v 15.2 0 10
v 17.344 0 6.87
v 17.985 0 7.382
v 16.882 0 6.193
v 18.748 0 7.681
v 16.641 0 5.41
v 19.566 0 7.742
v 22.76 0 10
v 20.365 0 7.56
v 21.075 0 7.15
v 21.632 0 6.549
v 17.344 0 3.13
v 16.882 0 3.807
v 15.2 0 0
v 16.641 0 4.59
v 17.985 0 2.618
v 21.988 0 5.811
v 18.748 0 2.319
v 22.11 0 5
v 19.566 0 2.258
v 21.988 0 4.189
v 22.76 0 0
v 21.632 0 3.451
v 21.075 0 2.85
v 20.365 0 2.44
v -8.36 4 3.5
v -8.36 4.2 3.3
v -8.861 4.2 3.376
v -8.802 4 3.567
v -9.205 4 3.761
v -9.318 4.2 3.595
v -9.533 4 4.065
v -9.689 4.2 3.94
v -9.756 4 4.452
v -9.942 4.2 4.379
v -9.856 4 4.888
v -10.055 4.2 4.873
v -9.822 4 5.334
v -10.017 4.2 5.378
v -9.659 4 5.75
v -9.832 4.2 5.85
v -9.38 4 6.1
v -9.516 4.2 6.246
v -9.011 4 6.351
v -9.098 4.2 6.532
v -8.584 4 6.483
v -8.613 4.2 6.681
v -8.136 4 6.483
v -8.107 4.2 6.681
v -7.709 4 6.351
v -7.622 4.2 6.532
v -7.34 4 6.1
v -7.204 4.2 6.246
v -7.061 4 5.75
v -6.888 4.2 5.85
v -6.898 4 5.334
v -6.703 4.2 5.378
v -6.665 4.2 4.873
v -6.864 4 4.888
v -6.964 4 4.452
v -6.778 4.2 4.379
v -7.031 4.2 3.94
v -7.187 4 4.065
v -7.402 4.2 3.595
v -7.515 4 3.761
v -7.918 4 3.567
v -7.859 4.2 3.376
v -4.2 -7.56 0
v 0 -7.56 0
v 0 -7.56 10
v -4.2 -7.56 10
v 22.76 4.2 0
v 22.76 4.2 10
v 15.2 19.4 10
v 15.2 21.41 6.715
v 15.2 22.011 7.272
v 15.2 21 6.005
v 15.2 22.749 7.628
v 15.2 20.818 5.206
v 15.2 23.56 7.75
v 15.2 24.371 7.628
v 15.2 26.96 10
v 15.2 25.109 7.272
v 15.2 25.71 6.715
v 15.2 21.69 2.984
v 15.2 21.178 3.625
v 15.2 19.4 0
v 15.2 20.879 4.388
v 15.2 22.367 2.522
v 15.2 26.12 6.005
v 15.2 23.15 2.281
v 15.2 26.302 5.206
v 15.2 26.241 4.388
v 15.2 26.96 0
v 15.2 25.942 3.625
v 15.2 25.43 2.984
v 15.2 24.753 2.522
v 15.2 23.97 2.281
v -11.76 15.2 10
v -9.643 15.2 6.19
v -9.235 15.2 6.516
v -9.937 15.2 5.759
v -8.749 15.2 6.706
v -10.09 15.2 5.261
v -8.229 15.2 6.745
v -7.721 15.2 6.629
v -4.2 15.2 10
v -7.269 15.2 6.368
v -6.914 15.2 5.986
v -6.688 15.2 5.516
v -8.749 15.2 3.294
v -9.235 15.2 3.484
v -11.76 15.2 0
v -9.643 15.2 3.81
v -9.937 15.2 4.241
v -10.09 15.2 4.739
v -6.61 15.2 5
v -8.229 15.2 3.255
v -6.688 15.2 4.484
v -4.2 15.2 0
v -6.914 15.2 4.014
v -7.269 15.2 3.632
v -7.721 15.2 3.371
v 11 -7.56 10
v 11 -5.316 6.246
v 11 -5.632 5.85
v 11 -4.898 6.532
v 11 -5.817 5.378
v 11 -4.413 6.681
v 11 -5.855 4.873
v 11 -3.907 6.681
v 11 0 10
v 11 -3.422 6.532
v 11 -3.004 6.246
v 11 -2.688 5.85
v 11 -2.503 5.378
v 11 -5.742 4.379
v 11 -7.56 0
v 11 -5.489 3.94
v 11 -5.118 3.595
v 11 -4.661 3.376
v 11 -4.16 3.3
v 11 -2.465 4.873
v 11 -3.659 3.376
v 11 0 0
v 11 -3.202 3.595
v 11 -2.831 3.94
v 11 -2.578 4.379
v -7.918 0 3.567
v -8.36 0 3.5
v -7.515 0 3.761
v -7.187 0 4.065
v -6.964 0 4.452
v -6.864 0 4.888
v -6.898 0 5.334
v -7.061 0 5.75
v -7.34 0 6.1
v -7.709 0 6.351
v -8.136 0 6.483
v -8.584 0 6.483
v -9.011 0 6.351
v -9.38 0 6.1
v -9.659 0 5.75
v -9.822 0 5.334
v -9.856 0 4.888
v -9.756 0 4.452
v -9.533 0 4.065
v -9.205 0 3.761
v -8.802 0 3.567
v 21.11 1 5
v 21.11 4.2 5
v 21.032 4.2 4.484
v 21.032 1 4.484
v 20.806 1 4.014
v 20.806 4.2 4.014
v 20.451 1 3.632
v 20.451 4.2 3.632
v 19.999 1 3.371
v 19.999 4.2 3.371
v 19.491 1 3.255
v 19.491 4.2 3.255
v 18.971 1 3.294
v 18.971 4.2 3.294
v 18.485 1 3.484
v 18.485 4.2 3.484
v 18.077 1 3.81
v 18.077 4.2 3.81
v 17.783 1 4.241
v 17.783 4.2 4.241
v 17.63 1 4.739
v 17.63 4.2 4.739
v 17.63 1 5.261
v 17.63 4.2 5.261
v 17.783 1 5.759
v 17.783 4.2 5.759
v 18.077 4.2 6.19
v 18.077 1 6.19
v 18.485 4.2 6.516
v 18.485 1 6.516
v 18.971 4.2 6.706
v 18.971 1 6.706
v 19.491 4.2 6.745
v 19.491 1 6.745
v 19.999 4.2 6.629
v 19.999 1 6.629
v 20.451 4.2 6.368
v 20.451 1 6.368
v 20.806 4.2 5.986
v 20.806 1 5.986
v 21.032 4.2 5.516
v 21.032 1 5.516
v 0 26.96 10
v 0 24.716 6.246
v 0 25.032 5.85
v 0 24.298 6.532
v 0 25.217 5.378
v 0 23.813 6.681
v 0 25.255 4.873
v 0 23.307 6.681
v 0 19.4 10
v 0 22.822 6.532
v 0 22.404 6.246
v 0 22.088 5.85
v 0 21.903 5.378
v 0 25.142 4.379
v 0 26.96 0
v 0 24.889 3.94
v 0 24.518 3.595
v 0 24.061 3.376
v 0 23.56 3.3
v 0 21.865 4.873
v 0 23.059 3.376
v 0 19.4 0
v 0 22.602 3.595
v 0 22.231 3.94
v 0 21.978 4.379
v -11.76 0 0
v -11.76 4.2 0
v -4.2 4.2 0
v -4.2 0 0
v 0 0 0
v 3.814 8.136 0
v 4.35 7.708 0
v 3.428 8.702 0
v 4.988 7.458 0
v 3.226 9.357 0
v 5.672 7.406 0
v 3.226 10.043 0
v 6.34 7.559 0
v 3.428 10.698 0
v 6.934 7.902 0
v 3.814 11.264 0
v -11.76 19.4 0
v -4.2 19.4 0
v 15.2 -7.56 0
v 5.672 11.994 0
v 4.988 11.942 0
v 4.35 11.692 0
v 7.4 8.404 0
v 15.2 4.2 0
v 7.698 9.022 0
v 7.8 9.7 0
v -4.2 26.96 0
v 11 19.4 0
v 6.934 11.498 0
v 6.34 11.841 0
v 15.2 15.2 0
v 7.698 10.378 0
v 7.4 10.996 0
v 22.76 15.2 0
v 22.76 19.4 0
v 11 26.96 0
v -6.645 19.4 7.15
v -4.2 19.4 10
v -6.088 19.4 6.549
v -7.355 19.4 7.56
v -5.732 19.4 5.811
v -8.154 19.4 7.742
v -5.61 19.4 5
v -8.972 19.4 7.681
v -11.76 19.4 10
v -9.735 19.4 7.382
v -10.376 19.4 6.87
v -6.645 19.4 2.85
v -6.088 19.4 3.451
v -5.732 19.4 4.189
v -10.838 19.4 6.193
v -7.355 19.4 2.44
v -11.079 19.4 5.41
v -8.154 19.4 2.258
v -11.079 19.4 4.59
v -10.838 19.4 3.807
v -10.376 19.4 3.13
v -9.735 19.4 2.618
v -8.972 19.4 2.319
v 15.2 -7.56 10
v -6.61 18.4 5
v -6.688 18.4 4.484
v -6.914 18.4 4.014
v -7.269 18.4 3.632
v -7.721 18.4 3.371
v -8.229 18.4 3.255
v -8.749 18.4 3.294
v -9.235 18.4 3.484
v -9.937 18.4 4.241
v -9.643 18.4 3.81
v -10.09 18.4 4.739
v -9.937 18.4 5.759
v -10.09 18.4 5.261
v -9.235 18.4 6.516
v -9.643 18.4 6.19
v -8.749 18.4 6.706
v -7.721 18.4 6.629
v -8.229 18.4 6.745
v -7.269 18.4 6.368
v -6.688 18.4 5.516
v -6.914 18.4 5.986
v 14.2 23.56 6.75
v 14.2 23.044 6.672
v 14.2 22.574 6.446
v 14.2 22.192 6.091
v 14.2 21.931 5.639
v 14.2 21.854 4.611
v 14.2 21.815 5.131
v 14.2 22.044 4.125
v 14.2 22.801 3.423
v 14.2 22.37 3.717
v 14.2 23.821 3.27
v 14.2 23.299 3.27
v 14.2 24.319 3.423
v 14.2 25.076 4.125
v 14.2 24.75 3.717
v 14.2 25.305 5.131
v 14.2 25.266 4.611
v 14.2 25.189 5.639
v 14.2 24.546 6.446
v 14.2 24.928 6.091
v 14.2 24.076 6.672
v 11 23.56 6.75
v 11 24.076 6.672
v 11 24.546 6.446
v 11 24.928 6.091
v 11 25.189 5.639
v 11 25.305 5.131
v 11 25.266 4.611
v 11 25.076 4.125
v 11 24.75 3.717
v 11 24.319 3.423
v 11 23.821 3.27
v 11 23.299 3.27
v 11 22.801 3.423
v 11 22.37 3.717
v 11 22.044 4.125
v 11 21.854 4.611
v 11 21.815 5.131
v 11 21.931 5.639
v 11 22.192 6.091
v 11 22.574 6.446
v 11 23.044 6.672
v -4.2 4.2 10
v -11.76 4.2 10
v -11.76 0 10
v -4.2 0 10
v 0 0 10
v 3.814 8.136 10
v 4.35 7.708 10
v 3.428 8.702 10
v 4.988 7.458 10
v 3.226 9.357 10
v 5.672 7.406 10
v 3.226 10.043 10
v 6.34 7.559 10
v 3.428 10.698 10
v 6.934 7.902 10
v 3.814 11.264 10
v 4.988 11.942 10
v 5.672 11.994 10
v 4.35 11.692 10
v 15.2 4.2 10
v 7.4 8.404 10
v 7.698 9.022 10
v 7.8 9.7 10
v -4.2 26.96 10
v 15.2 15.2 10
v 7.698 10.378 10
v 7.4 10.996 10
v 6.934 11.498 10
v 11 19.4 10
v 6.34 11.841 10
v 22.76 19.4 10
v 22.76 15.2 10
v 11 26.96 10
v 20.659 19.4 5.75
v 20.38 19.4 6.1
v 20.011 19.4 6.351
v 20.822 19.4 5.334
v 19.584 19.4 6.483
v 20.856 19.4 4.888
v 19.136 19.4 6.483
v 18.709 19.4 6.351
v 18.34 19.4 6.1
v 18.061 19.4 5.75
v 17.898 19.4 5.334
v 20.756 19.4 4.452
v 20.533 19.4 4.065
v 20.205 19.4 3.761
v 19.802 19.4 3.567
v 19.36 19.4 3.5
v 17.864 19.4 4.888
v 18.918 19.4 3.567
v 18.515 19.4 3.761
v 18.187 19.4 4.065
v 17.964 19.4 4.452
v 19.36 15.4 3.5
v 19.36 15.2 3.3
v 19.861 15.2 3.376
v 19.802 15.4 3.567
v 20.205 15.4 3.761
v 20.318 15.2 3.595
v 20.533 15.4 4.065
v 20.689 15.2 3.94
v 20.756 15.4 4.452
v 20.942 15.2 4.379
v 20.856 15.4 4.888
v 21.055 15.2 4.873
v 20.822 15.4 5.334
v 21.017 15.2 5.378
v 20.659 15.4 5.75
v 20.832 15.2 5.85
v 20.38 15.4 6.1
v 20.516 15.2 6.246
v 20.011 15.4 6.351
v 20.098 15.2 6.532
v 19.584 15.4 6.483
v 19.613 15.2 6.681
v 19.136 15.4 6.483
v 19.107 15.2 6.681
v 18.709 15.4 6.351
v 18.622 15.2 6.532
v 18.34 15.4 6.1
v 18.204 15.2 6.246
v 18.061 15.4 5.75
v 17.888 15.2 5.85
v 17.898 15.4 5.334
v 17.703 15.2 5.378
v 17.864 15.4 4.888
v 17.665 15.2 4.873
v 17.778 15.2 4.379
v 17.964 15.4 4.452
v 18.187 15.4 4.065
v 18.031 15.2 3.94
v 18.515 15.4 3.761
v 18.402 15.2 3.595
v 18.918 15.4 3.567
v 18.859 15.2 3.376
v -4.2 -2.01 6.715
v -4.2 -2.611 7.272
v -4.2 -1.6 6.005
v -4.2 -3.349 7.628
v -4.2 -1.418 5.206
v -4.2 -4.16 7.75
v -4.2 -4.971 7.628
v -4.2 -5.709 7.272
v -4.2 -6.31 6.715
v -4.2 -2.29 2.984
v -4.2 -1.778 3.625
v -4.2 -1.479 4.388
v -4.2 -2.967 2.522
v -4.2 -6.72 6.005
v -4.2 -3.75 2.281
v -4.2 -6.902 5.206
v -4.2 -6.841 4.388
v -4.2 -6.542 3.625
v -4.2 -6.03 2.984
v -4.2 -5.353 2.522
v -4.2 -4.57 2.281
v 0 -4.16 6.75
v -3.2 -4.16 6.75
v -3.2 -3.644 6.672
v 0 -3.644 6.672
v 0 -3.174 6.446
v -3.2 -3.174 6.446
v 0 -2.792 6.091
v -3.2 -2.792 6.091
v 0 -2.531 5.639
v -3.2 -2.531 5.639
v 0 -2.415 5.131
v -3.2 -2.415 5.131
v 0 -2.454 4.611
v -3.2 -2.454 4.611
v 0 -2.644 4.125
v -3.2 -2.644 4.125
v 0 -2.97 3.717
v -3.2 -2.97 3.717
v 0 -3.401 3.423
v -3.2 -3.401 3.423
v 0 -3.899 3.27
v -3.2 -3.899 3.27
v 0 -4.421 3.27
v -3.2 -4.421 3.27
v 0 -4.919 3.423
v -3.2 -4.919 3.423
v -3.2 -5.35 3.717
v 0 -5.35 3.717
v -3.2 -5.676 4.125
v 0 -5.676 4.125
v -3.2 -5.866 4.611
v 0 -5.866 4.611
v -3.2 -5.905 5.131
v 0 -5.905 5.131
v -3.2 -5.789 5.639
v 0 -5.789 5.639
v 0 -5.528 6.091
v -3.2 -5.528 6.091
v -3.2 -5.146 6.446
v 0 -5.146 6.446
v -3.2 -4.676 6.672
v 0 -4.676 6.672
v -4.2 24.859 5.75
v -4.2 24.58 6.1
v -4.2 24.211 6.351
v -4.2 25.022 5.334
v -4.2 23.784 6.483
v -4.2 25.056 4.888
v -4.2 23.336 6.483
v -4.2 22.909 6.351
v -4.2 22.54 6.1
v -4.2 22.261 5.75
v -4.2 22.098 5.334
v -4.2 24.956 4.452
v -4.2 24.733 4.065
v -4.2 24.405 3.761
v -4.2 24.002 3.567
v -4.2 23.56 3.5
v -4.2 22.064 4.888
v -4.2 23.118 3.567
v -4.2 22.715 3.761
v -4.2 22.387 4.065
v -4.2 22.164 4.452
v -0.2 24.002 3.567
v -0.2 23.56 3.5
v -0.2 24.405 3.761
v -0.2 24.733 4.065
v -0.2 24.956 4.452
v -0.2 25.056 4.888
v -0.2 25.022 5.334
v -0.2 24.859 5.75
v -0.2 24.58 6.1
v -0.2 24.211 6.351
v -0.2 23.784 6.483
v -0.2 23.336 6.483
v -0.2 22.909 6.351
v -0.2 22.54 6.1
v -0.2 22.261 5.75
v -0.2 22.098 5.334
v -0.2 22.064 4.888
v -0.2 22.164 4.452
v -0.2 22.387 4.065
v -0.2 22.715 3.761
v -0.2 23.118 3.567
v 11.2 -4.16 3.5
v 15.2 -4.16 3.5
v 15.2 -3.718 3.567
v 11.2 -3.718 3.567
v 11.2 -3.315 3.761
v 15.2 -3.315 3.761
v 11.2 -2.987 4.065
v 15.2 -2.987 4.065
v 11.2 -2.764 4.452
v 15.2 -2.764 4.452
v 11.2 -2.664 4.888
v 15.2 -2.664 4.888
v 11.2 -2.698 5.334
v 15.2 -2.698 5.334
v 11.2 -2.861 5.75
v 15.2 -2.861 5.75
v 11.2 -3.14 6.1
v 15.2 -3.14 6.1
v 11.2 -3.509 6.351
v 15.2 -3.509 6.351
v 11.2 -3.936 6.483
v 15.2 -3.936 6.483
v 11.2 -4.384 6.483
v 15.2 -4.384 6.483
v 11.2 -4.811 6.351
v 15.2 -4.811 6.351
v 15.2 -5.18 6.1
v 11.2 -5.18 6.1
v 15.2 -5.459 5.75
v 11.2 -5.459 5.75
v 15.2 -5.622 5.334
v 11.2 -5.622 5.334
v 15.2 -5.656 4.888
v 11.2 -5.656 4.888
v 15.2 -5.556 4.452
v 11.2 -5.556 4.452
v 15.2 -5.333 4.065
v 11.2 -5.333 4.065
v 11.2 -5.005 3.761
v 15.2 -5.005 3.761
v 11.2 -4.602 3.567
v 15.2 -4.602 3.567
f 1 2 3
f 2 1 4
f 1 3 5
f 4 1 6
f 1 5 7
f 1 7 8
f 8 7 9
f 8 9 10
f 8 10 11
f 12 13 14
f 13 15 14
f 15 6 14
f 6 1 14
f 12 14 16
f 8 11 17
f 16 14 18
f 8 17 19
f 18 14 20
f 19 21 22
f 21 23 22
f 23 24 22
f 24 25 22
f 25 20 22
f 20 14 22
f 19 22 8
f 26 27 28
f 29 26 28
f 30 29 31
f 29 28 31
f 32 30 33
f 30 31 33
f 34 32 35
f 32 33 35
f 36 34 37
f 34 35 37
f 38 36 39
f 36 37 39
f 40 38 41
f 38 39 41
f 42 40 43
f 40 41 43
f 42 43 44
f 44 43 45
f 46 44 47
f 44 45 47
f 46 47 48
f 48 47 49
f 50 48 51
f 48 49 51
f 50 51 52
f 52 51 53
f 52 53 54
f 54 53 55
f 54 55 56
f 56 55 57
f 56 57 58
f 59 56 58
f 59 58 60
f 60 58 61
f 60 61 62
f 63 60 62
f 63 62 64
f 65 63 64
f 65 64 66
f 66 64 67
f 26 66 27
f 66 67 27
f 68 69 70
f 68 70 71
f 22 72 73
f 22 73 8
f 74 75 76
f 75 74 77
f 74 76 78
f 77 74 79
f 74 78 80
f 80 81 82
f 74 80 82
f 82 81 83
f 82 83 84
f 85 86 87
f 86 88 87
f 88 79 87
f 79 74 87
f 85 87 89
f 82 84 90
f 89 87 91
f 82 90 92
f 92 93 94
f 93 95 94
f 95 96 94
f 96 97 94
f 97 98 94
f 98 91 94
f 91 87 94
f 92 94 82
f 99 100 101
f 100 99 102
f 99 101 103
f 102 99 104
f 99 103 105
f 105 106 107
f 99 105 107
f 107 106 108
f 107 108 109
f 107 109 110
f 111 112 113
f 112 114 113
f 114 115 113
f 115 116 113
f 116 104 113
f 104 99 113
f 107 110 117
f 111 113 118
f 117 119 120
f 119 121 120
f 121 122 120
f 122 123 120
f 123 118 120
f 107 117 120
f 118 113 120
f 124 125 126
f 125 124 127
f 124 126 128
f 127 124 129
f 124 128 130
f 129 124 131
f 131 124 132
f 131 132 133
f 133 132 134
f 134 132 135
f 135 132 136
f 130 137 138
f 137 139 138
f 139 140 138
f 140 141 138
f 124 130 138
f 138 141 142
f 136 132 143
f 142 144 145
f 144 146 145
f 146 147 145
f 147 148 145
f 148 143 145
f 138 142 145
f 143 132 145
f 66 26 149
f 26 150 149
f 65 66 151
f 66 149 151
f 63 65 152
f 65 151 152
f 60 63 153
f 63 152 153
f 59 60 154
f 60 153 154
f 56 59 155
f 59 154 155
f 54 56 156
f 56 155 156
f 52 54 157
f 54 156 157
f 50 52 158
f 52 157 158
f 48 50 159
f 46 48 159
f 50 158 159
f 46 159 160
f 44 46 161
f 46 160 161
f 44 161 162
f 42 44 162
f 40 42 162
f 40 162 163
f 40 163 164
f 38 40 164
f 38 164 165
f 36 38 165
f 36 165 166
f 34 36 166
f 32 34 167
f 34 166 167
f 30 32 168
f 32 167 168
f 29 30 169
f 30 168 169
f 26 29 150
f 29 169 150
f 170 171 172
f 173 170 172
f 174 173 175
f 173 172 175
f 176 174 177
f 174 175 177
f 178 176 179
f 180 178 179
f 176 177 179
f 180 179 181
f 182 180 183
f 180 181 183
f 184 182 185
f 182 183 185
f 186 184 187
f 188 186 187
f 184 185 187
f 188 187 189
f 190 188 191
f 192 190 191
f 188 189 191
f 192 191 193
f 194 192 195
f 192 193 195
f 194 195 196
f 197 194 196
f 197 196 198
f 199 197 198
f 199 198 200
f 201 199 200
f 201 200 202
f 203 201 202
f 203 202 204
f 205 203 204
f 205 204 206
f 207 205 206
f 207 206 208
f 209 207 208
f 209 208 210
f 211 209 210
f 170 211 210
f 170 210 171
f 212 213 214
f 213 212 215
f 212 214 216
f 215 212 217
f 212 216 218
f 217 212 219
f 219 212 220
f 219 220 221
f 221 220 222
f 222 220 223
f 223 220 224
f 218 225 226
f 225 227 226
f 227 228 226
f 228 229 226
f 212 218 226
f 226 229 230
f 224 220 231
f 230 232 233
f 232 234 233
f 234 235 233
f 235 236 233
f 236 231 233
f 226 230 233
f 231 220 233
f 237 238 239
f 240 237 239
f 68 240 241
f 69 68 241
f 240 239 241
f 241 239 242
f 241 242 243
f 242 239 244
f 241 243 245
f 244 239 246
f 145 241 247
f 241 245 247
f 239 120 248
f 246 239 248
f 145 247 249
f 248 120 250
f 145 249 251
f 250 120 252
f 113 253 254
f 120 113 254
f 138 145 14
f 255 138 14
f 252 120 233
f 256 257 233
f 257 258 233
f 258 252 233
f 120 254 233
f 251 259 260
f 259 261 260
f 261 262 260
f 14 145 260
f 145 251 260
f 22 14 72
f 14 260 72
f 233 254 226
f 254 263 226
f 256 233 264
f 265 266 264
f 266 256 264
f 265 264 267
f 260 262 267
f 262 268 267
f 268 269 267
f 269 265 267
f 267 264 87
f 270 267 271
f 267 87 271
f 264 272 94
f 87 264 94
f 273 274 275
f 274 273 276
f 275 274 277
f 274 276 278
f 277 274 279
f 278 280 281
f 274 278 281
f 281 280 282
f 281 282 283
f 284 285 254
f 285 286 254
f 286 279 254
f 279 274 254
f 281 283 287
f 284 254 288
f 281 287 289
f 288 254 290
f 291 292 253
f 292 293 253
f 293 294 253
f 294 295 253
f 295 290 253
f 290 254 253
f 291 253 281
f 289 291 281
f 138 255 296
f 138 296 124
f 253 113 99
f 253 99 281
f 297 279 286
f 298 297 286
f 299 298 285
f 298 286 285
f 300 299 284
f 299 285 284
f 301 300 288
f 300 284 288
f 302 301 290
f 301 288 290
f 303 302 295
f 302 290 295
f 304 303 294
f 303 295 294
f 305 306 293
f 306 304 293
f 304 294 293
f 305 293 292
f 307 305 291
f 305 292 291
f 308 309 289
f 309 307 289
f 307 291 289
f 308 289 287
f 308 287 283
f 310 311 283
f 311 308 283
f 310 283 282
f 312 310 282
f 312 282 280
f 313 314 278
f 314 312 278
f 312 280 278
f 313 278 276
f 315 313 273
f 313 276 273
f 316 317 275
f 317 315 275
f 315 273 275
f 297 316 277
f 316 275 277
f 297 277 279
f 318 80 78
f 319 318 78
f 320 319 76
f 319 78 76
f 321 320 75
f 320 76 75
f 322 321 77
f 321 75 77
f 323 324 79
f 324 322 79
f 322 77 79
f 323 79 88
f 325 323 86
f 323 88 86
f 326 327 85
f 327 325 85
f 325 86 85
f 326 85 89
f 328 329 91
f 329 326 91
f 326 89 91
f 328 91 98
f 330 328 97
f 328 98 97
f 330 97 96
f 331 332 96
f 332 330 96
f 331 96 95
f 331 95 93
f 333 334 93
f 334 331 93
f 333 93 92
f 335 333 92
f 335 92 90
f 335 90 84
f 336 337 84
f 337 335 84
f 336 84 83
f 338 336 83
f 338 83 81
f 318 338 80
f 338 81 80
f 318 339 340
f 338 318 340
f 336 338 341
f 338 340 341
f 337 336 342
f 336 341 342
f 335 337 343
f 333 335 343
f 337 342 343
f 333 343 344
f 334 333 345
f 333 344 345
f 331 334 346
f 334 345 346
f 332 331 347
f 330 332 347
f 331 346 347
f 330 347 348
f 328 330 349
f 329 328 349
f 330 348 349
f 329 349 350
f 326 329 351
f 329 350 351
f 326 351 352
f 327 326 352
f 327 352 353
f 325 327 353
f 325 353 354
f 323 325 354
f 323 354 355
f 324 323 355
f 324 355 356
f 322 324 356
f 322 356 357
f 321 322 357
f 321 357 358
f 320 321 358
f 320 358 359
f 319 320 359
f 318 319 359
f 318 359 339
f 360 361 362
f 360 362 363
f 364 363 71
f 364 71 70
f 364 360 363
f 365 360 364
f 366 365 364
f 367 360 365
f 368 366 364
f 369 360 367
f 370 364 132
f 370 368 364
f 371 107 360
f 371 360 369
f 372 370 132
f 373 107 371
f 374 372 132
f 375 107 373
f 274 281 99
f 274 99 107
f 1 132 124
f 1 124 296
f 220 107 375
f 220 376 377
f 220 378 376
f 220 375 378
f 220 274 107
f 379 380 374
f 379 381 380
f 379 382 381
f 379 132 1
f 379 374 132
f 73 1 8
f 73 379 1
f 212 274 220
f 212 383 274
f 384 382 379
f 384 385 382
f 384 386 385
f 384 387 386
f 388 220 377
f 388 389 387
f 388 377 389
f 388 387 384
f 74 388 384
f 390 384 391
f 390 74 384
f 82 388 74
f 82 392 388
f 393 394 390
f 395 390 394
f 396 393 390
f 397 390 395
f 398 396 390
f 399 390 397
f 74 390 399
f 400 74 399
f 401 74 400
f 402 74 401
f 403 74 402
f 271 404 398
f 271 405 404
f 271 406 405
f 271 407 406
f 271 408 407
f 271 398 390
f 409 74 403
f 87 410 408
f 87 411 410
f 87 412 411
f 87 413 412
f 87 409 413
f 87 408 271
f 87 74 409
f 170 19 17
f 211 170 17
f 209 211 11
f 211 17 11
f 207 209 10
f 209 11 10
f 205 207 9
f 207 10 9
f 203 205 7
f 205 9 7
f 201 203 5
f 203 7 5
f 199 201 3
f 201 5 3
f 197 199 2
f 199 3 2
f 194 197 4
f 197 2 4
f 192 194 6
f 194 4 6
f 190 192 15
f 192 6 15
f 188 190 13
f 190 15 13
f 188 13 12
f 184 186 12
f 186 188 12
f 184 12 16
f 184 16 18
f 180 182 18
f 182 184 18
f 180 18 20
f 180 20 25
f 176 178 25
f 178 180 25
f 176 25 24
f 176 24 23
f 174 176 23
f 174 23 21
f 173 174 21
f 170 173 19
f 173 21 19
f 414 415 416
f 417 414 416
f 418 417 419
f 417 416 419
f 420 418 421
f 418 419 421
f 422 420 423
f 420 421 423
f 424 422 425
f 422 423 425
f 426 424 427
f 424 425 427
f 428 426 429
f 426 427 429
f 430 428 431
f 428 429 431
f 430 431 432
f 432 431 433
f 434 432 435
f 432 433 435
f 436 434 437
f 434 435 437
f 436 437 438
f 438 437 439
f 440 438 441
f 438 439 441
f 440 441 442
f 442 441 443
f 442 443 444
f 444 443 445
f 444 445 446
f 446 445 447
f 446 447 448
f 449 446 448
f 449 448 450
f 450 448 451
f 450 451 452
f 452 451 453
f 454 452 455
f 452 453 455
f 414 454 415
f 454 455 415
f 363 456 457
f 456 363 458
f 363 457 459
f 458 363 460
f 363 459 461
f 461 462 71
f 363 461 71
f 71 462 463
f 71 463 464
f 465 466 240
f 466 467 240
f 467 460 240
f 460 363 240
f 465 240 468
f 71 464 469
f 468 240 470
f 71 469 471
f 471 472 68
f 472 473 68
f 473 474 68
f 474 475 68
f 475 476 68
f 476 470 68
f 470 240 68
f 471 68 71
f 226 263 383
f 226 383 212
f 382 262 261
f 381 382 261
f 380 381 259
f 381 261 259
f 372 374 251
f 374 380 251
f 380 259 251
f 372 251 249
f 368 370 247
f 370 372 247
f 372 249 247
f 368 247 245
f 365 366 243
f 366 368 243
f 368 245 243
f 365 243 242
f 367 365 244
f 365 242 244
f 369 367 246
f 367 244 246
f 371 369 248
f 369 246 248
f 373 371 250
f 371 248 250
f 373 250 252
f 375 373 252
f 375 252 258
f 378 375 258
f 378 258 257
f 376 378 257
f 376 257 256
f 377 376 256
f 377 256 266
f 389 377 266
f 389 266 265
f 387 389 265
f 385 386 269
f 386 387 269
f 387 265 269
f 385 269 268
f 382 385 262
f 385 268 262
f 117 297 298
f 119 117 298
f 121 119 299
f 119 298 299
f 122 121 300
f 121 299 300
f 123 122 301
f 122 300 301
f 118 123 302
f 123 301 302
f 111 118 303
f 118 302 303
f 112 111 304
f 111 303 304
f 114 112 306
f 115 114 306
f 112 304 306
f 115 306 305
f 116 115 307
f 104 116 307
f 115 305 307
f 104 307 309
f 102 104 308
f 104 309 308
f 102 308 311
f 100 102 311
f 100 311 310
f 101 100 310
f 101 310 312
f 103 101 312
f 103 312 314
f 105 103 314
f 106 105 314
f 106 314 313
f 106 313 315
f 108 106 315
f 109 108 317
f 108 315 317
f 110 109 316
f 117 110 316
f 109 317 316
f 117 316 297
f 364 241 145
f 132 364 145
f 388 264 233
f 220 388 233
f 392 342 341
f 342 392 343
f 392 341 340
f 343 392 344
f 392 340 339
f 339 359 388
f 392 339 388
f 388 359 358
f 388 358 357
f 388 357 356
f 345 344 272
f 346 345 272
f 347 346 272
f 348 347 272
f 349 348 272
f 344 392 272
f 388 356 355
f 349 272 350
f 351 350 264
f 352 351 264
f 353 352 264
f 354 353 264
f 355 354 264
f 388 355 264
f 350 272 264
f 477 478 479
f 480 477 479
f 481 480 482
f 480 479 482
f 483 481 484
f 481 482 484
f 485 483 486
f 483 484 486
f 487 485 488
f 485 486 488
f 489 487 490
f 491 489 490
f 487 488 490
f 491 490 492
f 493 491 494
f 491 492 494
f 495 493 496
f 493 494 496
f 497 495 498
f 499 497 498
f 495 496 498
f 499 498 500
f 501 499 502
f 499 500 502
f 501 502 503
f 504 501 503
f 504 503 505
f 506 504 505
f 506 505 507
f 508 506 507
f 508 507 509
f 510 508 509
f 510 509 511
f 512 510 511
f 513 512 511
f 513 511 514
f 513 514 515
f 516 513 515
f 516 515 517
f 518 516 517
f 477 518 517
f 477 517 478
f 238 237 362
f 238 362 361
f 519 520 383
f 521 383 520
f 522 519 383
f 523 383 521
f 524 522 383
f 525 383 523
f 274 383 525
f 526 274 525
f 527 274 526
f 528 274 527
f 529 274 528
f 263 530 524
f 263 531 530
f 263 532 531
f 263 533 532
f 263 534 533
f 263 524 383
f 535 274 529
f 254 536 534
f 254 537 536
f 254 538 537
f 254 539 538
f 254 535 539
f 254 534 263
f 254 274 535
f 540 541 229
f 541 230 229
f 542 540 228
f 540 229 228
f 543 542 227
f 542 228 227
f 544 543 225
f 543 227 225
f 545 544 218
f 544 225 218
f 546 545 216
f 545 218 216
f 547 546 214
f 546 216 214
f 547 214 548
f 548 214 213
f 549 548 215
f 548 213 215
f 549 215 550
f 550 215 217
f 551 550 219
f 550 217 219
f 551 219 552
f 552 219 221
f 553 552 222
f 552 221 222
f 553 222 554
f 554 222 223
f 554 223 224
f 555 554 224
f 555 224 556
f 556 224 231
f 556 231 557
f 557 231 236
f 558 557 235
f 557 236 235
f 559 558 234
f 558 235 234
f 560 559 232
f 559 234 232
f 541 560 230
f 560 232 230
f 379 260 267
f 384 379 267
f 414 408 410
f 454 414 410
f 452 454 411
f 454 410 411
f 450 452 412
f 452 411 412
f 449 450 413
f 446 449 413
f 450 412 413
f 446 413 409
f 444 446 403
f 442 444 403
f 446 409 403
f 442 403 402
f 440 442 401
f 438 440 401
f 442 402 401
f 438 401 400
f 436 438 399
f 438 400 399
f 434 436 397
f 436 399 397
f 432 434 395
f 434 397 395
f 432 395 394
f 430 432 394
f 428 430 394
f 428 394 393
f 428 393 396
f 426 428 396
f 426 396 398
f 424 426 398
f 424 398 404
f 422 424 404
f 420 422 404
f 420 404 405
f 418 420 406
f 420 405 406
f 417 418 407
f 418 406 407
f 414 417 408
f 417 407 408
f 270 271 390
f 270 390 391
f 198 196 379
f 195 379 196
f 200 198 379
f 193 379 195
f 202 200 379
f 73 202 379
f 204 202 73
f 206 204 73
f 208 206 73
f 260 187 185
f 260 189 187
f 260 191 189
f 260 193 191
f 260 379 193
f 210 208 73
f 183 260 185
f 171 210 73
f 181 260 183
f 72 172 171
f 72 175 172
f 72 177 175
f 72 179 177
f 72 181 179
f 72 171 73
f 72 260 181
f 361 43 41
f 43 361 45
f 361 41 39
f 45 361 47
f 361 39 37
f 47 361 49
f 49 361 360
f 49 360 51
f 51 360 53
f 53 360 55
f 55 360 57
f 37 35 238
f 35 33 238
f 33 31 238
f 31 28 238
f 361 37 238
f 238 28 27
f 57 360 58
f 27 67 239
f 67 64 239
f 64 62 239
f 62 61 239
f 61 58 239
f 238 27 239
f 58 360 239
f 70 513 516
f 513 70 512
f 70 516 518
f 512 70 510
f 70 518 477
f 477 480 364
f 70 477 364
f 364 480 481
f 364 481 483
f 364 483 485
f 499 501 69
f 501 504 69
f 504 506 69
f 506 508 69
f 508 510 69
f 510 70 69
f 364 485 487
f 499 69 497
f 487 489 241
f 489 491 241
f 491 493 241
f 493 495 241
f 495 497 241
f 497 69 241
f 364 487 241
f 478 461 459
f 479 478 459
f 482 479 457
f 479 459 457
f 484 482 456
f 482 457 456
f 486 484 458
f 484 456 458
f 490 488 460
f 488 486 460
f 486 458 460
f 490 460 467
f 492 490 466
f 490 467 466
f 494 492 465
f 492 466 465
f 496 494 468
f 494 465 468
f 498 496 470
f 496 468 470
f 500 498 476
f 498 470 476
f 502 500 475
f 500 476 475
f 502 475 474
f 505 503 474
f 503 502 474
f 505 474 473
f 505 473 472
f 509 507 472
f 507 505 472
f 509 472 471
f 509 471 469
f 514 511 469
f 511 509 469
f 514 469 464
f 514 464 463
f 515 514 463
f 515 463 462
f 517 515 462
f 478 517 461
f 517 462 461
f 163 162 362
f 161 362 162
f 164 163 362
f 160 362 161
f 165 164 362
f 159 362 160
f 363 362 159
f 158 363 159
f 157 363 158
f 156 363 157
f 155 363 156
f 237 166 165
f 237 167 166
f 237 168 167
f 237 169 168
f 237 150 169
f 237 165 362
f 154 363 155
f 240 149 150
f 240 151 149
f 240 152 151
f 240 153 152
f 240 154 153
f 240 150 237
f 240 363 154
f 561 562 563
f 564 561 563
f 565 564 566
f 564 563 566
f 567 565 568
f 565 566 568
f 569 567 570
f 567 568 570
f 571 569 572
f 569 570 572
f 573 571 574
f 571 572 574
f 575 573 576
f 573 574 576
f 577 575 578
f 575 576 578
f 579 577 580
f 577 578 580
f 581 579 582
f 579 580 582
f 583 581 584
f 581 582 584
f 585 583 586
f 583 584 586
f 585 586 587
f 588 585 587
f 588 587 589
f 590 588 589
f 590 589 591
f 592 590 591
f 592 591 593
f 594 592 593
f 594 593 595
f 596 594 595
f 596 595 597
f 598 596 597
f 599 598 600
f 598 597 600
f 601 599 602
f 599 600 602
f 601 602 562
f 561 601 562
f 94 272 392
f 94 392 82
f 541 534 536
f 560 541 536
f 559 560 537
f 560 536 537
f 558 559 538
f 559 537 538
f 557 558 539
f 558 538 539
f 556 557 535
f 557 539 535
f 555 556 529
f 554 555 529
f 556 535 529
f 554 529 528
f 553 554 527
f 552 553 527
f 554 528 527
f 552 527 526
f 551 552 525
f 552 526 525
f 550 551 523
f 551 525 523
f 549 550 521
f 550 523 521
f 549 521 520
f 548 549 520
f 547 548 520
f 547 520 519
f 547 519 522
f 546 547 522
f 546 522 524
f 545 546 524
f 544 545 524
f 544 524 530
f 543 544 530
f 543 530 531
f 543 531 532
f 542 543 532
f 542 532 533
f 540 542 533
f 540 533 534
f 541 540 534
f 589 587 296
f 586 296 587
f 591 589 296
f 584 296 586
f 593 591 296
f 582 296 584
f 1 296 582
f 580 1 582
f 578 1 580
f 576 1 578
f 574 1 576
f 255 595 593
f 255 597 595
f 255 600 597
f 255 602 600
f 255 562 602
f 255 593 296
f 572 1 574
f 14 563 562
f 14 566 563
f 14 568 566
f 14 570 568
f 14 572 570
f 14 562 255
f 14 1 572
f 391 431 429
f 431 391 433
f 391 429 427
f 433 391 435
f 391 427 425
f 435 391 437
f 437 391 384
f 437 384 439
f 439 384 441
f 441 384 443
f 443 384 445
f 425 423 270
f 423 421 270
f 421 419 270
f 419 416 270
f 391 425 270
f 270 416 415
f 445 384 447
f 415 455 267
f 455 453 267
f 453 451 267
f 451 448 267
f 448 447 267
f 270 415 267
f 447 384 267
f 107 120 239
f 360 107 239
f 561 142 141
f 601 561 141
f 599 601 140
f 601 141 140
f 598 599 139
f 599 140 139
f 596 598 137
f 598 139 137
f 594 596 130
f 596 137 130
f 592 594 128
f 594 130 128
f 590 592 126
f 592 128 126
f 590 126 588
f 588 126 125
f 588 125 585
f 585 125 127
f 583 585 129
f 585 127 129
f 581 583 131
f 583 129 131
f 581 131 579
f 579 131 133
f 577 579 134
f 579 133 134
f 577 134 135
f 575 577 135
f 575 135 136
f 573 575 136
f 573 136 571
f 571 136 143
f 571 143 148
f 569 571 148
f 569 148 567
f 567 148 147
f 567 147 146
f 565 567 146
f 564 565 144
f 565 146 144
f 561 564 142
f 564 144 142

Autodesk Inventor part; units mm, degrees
ref_plane "YZ Plane" through (0, 0, 0) normal (1, 0, 0) x (0, 1, 0)
ref_plane "XZ Plane" through (0, 0, 0) normal (0, 1, 0) x (-1, 0, 0)
ref_plane "XY Plane" through (0, 0, 0) normal (0, 0, 1) x (1, 0, 0)
sketch "Szkic1" plane through (0, 0, 0) normal (0, 0, 1) x (1, 0, 0)
  line L0 (0, -7.56) -> (0, 0)
  line L1 (0, 19.4) -> (0, 26.96)
  line L2 (-4.2, 4.2) -> (-11.76, 4.2)
  line L3 (-11.76, 15.2) -> (-4.2, 15.2)
  line L4 (15.2, 15.2) -> (22.76, 15.2)
  line L5 (15.2, 4.2) -> (22.76, 4.2)
  line L6 (-4.2, 26.96) -> (-4.2, 19.4)
  line L7 (-4.2, 19.4) -> (-11.76, 19.4)
  line L8 (-4.2, 15.2) -> (-4.2, 4.2)
  line L9 (-4.2, 0) -> (-4.2, -7.56)
  line L10 (-11.76, 0) -> (-4.2, 0)
  line L11 (15.2, -7.56) -> (11, -7.56)
  line L12 (0, -7.56) -> (-4.2, -7.56)
  line L13 (0, 0) -> (11, 0)
  line L14 (15.2, 0) -> (22.76, 0)
  line L15 (11, 26.96) -> (11, 19.4)
  line L16 (11, 0) -> (11, -7.56)
  line L17 (15.2, -7.56) -> (15.2, 0)
  line L18 (15.2, 4.2) -> (15.2, 15.2)
  line L19 (15.2, 19.4) -> (15.2, 26.96)
  line L20 (22.76, 19.4) -> (15.2, 19.4)
  line L21 (11, 19.4) -> (0, 19.4)
  line L22 (22.76, 19.4) -> (22.76, 15.2)
  line L23 (22.76, 4.2) -> (22.76, 0)
  line L24 (-4.2, 26.96) -> (0, 26.96)
  line L25 (11, 26.96) -> (15.2, 26.96)
  line L26 (-11.76, 0) -> (-11.76, 4.2)
  line L27 (-11.76, 15.2) -> (-11.76, 19.4)
  circle A0 centre (5.5, 9.7) radius 2.3
  dimension "d0" = 4.6
extrude "Wyciągnięcie proste1" add sketch "Szkic1" along normal blind 10
sketch "Szkic2" plane through (-11.76, 19.4, 0) normal (0, 1, 0) x (1, 0, 0)
  line L0 (7.56, 0) -> (0, 0) projected
  line L1 (0, 0) -> (0, -10) projected
  line L2 (7.56, -10) -> (0, -10) projected
  line L3 (7.56, 0) -> (7.56, -10) projected
  line L4 (34.52, 0) -> (26.96, 0) projected
  line L5 (26.96, 0) -> (26.96, -10) projected
  line L6 (34.52, -10) -> (26.96, -10) projected
  line L7 (34.52, 0) -> (34.52, -10) projected
  line L8 (0, 0) -> (0, -10) projected
  line L9 (0, -5) -> (3.4, -5)
  line L10 (34.52, 0) -> (34.52, -10) projected
  line L11 (34.52, -5) -> (31.12, -5)
  circle A0 centre (3.4, -5) radius 1.75
  circle A1 centre (31.12, -5) radius 1.75
  point P0 (11.76, 0)
  dimension "d3" = 3.4
  dimension "d4" = 3.4
  dimension "d5" = 3.5
  dimension "d6" = 3.5
extrude "Wyciągnięcie proste2" cut sketch "Szkic2" against normal through all contours A0 | A1
sketch "Szkic3" plane through (-4.2, -7.56, 0) normal (-1, 0, 0) x (0, 0, 1)
  line L0 (0, 7.56) -> (0, 0) projected
  line L1 (0, 0) -> (10, 0) projected
  line L2 (10, 7.56) -> (10, 0) projected
  line L3 (0, 7.56) -> (10, 7.56) projected
  line L4 (0, 34.52) -> (0, 26.96) projected
  line L5 (0, 26.96) -> (10, 26.96) projected
  line L6 (10, 34.52) -> (10, 26.96) projected
  line L7 (0, 34.52) -> (10, 34.52) projected
  line L8 (5, 0) -> (5, 3.4)
  line L9 (0, 34.52) -> (10, 34.52) projected
  line L10 (5, 34.52) -> (5, 31.12)
  circle A0 centre (5, 3.4) radius 1.75
  circle A1 centre (5, 31.12) radius 1.75
  point P0 (0, 7.56)
  dimension "d9" = 3.4
  dimension "d10" = 3.4
  dimension "d11" = 3.5
  dimension "d12" = 3.5
extrude "Wyciągnięcie proste3" cut sketch "Szkic3" against normal through all contours A0 | A1
chamfer "Faza2" distance 1 angle 45 4 edges at (-4.2, -4.16, 3.25) (17.61, 0, 5) (15.2, 23.56, 3.25) (-10.11, 19.4, 5)
sketch "Szkic8" plane through (15.2, -7.56, 0) normal (1, 0, 0) x (0, 0, -1)
  circle A0 centre (-5, 3.4) radius 1.75 projected
  circle A1 centre (-5, 3.4) radius 1.5
  point P0 (0, 7.56)
  dimension "d42" = 3
extrude "Wyciągnięcie proste8" add sketch "Szkic8" against normal up to surface (4.2 mm away)
pattern_circular "Szyk kołowy3" count 4 over 360 about axis through (5.5, 9.7, 0) along (0, 0, 1) of "Wyciągnięcie proste8"
chamfer "Faza3" distance 0.2 angle 45 4 edges at (11, -4.16, 6.5) (-8.36, 4.2, 6.5) (0, 23.56, 6.5) (19.36, 15.2, 6.5)
properties part number "GripperMotorHinges"
